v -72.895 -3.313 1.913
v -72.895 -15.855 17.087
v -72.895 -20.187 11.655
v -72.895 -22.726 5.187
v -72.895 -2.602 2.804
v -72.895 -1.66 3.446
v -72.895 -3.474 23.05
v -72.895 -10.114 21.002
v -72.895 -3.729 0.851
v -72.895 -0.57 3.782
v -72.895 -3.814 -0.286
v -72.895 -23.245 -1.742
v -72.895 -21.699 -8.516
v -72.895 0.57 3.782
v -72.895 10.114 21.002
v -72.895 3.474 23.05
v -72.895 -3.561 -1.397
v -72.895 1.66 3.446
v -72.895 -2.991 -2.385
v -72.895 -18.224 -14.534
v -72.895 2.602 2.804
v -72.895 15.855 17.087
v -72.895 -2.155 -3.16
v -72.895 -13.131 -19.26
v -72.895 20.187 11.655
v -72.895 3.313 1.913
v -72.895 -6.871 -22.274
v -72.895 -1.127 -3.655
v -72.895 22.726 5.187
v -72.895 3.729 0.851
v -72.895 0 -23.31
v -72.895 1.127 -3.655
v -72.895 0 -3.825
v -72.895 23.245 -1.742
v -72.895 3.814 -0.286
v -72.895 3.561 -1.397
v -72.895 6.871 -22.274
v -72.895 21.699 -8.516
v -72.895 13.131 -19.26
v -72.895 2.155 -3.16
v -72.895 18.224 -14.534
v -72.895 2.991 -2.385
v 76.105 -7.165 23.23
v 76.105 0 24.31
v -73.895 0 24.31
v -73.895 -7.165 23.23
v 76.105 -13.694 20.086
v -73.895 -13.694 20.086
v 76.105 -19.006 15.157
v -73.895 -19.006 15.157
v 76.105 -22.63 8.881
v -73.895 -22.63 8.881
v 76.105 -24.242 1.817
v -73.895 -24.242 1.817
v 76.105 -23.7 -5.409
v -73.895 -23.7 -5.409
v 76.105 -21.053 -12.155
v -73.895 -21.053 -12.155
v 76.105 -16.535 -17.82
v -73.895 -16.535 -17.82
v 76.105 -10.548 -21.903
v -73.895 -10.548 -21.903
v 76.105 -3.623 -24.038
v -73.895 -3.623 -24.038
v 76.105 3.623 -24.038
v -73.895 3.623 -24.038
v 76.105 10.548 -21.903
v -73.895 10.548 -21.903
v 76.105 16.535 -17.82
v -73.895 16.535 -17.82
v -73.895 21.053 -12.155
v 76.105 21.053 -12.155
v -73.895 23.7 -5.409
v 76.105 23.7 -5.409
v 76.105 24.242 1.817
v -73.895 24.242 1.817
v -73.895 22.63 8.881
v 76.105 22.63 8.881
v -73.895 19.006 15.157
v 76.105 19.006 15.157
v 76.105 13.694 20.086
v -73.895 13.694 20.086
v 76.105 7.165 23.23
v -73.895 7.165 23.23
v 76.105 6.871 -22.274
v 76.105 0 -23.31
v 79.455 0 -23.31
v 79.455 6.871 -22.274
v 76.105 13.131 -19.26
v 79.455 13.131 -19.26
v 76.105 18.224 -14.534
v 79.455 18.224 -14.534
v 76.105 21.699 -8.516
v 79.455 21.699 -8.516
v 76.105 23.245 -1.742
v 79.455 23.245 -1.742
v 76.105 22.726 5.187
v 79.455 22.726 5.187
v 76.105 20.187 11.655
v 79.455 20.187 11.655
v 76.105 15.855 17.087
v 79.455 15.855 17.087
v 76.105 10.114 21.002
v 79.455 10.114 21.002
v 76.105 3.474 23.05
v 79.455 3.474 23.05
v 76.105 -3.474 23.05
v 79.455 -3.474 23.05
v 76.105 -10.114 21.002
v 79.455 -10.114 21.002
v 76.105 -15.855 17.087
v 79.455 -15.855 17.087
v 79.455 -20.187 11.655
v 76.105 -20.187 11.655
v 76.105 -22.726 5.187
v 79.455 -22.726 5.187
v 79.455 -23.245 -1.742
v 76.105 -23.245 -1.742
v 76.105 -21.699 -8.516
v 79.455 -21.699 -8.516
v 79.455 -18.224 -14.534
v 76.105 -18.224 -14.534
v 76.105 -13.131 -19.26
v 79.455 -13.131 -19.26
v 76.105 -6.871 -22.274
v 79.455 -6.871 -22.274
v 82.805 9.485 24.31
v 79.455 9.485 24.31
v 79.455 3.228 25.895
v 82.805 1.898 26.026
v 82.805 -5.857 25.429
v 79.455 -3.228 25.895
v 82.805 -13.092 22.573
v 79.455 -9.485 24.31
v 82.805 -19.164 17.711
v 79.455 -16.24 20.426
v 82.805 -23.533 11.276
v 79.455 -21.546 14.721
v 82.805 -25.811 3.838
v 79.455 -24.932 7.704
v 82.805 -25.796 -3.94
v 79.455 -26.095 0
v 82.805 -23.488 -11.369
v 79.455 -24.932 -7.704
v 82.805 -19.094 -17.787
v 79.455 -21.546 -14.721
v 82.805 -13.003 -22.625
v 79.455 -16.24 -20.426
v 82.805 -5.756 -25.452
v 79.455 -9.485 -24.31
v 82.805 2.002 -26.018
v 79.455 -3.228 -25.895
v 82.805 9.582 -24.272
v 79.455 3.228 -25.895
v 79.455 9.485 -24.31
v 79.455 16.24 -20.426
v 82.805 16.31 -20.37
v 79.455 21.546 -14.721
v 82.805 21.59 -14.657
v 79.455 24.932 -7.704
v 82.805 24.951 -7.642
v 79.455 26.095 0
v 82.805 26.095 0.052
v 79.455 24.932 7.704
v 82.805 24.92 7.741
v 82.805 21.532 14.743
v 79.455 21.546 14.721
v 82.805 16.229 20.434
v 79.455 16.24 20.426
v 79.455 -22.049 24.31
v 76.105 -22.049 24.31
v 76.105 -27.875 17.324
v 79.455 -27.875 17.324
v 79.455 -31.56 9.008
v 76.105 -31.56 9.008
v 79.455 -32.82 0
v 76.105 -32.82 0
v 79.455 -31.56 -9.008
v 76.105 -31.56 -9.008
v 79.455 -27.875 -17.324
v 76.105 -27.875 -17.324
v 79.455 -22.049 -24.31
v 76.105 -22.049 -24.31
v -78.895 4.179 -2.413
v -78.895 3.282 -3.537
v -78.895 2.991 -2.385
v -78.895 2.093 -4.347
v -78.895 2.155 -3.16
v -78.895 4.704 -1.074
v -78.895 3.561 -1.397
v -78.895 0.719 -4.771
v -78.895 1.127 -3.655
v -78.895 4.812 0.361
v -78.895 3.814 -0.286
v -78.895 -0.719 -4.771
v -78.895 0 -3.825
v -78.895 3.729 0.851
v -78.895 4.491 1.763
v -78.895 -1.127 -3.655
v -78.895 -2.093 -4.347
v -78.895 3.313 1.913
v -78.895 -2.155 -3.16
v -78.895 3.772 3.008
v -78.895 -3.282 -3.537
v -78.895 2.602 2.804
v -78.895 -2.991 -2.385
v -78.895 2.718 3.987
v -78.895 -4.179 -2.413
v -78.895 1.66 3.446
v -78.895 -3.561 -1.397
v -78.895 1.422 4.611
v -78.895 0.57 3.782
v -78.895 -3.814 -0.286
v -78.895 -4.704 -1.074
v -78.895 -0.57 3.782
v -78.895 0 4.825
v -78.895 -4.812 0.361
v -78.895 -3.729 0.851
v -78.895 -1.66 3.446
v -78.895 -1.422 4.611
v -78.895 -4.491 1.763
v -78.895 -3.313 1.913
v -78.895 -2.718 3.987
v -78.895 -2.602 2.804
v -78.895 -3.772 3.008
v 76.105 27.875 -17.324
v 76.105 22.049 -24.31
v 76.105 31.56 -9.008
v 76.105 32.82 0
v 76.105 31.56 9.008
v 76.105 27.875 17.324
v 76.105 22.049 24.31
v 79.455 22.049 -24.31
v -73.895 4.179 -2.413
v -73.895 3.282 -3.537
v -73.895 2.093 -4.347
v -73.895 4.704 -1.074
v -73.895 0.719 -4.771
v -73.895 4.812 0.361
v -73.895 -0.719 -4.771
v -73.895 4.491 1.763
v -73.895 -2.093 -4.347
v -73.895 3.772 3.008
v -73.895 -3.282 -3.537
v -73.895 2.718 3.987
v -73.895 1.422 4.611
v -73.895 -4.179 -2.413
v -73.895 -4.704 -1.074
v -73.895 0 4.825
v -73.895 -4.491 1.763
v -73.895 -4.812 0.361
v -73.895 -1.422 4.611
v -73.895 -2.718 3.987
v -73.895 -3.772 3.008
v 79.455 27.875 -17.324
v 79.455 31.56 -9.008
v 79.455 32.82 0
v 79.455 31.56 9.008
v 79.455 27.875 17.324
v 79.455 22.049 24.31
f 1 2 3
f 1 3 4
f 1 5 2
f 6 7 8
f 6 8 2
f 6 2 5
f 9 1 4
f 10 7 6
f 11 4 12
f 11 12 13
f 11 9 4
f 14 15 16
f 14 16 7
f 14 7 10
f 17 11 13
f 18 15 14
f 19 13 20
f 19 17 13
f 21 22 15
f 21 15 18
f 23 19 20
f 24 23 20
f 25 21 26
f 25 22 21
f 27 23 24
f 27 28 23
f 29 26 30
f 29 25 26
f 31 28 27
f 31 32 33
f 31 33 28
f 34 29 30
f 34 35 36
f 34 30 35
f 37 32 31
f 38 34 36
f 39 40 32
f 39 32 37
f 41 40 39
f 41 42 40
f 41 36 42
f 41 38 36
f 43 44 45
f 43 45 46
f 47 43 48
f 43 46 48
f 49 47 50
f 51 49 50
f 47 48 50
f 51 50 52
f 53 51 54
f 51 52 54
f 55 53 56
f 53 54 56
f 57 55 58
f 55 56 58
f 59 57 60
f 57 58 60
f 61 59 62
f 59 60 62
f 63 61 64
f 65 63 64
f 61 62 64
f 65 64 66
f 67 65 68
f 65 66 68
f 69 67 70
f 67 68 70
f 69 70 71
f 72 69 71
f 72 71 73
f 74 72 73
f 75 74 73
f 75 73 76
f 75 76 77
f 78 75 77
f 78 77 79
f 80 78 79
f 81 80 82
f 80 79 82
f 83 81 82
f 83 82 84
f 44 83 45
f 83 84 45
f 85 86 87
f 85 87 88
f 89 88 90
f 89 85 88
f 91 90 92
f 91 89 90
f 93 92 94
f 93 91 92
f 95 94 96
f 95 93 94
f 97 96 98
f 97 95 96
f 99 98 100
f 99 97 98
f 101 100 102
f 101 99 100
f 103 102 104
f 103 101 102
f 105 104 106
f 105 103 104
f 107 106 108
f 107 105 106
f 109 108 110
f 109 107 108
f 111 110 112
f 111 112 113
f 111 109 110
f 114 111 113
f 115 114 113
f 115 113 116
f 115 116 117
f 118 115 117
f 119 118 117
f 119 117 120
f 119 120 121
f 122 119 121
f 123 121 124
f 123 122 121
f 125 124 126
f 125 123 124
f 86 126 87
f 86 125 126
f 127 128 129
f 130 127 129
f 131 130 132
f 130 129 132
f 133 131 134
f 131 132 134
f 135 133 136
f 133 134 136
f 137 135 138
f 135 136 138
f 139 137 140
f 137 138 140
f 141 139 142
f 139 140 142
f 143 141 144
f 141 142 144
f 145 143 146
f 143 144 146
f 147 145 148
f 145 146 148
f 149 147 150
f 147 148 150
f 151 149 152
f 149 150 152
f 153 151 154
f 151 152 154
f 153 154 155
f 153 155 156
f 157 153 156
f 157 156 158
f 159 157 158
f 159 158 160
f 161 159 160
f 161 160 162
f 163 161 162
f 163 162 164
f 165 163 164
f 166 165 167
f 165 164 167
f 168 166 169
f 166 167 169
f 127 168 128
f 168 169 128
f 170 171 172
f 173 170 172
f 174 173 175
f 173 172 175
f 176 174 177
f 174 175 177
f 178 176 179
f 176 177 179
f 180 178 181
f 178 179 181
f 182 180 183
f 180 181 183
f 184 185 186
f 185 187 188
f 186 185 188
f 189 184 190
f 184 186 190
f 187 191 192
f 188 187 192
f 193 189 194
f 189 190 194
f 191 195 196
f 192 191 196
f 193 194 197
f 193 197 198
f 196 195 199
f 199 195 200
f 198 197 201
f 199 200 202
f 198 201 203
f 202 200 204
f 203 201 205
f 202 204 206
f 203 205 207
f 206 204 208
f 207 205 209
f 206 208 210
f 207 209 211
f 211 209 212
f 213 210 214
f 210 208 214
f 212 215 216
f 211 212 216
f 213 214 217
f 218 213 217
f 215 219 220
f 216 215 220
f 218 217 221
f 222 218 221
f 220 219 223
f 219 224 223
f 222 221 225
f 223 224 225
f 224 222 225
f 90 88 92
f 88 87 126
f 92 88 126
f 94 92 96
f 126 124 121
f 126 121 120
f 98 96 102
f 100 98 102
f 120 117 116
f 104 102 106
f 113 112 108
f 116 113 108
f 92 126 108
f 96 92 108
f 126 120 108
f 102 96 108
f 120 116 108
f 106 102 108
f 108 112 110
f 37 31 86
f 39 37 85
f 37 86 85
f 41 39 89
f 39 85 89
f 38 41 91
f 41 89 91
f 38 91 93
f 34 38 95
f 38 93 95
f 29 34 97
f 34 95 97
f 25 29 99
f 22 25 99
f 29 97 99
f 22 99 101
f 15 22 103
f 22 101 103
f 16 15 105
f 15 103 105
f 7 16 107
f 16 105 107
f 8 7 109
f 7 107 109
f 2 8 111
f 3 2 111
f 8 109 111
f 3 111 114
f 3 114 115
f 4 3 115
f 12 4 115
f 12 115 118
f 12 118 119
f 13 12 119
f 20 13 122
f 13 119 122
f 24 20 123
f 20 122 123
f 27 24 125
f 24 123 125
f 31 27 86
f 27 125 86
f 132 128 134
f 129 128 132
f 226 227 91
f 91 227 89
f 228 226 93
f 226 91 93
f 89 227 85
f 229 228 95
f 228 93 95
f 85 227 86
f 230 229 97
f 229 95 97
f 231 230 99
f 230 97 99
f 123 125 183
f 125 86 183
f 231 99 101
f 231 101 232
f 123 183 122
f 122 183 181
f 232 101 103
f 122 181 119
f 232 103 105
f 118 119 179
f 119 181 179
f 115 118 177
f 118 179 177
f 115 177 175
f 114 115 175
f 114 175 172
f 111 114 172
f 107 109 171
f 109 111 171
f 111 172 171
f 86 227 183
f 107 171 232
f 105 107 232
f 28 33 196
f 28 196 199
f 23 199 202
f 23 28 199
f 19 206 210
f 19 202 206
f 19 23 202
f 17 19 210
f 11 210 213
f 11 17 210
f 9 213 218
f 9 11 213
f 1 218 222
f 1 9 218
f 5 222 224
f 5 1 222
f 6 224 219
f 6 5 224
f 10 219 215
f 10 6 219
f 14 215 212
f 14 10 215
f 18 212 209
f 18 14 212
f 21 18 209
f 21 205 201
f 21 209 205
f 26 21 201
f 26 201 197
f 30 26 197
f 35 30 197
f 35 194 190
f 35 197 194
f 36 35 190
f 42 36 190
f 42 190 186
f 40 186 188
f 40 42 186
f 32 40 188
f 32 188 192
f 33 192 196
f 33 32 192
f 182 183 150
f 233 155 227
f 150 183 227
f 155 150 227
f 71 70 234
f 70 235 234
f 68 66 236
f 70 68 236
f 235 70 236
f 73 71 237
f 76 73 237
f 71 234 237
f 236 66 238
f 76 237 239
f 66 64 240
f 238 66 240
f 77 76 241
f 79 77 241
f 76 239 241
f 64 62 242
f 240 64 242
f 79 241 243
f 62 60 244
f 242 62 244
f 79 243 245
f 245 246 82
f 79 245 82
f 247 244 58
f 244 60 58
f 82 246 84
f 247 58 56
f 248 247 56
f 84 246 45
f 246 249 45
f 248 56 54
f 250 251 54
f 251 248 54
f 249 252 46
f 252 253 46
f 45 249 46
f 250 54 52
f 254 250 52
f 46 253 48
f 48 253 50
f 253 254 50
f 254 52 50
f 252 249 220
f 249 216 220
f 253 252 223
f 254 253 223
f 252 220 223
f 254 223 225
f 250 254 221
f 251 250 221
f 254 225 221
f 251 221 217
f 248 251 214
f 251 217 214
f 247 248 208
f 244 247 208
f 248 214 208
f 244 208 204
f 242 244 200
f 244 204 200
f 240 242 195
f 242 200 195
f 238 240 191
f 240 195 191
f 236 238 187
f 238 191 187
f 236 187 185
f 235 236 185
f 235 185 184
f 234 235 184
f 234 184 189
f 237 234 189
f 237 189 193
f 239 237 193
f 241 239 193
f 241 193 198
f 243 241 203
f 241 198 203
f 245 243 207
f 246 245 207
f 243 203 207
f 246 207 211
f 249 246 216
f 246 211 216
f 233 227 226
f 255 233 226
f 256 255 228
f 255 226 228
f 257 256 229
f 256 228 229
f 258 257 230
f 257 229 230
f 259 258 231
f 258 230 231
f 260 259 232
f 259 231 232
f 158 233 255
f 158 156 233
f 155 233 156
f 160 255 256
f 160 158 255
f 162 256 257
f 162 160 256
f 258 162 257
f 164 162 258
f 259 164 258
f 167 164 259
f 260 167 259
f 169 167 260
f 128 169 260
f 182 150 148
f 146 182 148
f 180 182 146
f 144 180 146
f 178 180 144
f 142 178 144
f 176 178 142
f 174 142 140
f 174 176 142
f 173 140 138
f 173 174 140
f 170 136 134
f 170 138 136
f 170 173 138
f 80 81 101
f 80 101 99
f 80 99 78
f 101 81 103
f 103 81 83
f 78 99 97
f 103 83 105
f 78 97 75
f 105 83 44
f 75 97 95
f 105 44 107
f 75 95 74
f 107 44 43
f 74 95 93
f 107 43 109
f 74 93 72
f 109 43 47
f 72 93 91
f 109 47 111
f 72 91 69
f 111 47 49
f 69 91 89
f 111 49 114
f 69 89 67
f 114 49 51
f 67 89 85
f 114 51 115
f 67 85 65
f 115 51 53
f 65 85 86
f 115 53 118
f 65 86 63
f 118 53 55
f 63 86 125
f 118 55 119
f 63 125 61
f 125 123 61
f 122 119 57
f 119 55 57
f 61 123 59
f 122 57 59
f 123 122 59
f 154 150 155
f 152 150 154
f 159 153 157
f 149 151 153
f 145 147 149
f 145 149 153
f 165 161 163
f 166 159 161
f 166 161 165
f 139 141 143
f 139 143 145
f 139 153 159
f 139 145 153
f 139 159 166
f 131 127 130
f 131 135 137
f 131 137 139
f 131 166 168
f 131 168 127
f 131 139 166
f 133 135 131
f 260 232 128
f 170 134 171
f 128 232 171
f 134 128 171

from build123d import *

# Parameters (mm, degrees)
CUT_EXTRUDE1_DEPTH      = 45
CUT_EXTRUDE1_DEPTH_BACK = 260
SKETCH2_R               = 3.825
SKETCH3_R               = 23.31
CUT_EXTRUDE2_DEPTH      = 149
SKETCH4_R               = 24.31
SKETCH4_R_2             = 23.31
BOSS_EXTRUDE1_DEPTH     = 3.35
SKETCH6_R               = 26.095
BOSS_EXTRUDE7_DEPTH     = 3.35


with BuildPart() as part:
    # Sketch1 → Revolve2 (revolve)
    with BuildSketch(Plane.XY, mode=Mode.PRIVATE) as revolve2_sk:
        Polygon((-73.894736842, 0), (76.105263158, 0), (76.105263158, 24.31), (-73.894736842, 24.31), (-73.894736842, 4.825), (-78.894736842, 4.825), (-78.894736842, 0), align=None)
    revolve(revolve2_sk.sketch.rotate(Axis((-73.894736842, 0, 0), (1, 0, 0)), 90), axis=Axis((-73.894736842, 0, 0), (1, 0, 0)))

    # Sketch2 → Cut-Extrude1 (cut, two sides: drawn at the far end of the back side and taken through both)
    with BuildSketch(Plane.ZY.offset(78.894736842).offset(-CUT_EXTRUDE1_DEPTH_BACK)):
        with Locations(Location((0, 0, 0), (0, 0, 180))):
            Circle(SKETCH2_R)
    extrude(amount=CUT_EXTRUDE1_DEPTH + CUT_EXTRUDE1_DEPTH_BACK, mode=Mode.SUBTRACT)

    # Sketch3 → Cut-Extrude2 (cut)
    with BuildSketch(Plane(origin=(76.105263158, 0, 0), x_dir=(0, 0, -1), z_dir=(1, 0, 0))):
        Circle(SKETCH3_R)
    extrude(amount=-CUT_EXTRUDE2_DEPTH, mode=Mode.SUBTRACT)


with BuildPart() as body_2:
    # Sketch4 → Boss-Extrude1 (new body)
    # profile 1 of 4: a face of its own
    with BuildSketch(Plane(origin=(76.105263158, 0, 0), x_dir=(0, 0, -1), z_dir=(1, 0, 0))):
        with BuildLine():
            ThreePointArc((-24.31, 0), (0, 24.31), (24.31, 0))
            Line((24.31, 0), (24.31, 22.049405888))
            ThreePointArc((24.31, 22.049405888), (0, 32.82), (-24.31, 22.049405888))
            Line((-24.31, 22.049405888), (-24.31, 0))
        make_face()
    # profile 2 of 4: a face of its own
    with BuildSketch(Plane(origin=(76.105263158, 0, 0), x_dir=(0, 0, -1), z_dir=(1, 0, 0))):
        with BuildLine():
            ThreePointArc((-24.31, 0), (0, 24.31), (24.31, 0))
            Line((24.31, 0), (24.31, 22.049405888))
            ThreePointArc((24.31, 22.049405888), (0, 32.82), (-24.31, 22.049405888))
            Line((-24.31, 22.049405888), (-24.31, 0))
        make_face()
    # profile 3 of 4: a face of its own
    with BuildSketch(Plane(origin=(76.105263158, 0, 0), x_dir=(0, 0, -1), z_dir=(1, 0, 0))):
        with BuildLine():
            Line((24.31, -22.049405888), (24.31, 0))
            ThreePointArc((24.31, 0), (0, -24.31), (-24.31, 0))
            Line((-24.31, 0), (-24.31, -22.049405888))
            ThreePointArc((-24.31, -22.049405888), (0, -32.82), (24.31, -22.049405888))
        make_face()
    # profile 4 of 4: a face of its own
    with BuildSketch(Plane(origin=(76.105263158, 0, 0), x_dir=(0, 0, -1), z_dir=(1, 0, 0))):
        with Locations(Location((0, 0, 0), (0, 0, 180))):
            Circle(SKETCH4_R)
        Circle(SKETCH4_R_2, mode=Mode.SUBTRACT)
    extrude(amount=BOSS_EXTRUDE1_DEPTH)

    # Sketch6 → Boss-Extrude7 (add)
    with BuildSketch(Plane(origin=(79.455263158, 0, 0), x_dir=(0, 0, -1), z_dir=(1, 0, 0))):
        with Locations(Location((0, 0, 0), (0, 0, 158.684999133))):
            Circle(SKETCH6_R)
    extrude(amount=BOSS_EXTRUDE7_DEPTH)


solid = Compound([part.part, body_2.part])
